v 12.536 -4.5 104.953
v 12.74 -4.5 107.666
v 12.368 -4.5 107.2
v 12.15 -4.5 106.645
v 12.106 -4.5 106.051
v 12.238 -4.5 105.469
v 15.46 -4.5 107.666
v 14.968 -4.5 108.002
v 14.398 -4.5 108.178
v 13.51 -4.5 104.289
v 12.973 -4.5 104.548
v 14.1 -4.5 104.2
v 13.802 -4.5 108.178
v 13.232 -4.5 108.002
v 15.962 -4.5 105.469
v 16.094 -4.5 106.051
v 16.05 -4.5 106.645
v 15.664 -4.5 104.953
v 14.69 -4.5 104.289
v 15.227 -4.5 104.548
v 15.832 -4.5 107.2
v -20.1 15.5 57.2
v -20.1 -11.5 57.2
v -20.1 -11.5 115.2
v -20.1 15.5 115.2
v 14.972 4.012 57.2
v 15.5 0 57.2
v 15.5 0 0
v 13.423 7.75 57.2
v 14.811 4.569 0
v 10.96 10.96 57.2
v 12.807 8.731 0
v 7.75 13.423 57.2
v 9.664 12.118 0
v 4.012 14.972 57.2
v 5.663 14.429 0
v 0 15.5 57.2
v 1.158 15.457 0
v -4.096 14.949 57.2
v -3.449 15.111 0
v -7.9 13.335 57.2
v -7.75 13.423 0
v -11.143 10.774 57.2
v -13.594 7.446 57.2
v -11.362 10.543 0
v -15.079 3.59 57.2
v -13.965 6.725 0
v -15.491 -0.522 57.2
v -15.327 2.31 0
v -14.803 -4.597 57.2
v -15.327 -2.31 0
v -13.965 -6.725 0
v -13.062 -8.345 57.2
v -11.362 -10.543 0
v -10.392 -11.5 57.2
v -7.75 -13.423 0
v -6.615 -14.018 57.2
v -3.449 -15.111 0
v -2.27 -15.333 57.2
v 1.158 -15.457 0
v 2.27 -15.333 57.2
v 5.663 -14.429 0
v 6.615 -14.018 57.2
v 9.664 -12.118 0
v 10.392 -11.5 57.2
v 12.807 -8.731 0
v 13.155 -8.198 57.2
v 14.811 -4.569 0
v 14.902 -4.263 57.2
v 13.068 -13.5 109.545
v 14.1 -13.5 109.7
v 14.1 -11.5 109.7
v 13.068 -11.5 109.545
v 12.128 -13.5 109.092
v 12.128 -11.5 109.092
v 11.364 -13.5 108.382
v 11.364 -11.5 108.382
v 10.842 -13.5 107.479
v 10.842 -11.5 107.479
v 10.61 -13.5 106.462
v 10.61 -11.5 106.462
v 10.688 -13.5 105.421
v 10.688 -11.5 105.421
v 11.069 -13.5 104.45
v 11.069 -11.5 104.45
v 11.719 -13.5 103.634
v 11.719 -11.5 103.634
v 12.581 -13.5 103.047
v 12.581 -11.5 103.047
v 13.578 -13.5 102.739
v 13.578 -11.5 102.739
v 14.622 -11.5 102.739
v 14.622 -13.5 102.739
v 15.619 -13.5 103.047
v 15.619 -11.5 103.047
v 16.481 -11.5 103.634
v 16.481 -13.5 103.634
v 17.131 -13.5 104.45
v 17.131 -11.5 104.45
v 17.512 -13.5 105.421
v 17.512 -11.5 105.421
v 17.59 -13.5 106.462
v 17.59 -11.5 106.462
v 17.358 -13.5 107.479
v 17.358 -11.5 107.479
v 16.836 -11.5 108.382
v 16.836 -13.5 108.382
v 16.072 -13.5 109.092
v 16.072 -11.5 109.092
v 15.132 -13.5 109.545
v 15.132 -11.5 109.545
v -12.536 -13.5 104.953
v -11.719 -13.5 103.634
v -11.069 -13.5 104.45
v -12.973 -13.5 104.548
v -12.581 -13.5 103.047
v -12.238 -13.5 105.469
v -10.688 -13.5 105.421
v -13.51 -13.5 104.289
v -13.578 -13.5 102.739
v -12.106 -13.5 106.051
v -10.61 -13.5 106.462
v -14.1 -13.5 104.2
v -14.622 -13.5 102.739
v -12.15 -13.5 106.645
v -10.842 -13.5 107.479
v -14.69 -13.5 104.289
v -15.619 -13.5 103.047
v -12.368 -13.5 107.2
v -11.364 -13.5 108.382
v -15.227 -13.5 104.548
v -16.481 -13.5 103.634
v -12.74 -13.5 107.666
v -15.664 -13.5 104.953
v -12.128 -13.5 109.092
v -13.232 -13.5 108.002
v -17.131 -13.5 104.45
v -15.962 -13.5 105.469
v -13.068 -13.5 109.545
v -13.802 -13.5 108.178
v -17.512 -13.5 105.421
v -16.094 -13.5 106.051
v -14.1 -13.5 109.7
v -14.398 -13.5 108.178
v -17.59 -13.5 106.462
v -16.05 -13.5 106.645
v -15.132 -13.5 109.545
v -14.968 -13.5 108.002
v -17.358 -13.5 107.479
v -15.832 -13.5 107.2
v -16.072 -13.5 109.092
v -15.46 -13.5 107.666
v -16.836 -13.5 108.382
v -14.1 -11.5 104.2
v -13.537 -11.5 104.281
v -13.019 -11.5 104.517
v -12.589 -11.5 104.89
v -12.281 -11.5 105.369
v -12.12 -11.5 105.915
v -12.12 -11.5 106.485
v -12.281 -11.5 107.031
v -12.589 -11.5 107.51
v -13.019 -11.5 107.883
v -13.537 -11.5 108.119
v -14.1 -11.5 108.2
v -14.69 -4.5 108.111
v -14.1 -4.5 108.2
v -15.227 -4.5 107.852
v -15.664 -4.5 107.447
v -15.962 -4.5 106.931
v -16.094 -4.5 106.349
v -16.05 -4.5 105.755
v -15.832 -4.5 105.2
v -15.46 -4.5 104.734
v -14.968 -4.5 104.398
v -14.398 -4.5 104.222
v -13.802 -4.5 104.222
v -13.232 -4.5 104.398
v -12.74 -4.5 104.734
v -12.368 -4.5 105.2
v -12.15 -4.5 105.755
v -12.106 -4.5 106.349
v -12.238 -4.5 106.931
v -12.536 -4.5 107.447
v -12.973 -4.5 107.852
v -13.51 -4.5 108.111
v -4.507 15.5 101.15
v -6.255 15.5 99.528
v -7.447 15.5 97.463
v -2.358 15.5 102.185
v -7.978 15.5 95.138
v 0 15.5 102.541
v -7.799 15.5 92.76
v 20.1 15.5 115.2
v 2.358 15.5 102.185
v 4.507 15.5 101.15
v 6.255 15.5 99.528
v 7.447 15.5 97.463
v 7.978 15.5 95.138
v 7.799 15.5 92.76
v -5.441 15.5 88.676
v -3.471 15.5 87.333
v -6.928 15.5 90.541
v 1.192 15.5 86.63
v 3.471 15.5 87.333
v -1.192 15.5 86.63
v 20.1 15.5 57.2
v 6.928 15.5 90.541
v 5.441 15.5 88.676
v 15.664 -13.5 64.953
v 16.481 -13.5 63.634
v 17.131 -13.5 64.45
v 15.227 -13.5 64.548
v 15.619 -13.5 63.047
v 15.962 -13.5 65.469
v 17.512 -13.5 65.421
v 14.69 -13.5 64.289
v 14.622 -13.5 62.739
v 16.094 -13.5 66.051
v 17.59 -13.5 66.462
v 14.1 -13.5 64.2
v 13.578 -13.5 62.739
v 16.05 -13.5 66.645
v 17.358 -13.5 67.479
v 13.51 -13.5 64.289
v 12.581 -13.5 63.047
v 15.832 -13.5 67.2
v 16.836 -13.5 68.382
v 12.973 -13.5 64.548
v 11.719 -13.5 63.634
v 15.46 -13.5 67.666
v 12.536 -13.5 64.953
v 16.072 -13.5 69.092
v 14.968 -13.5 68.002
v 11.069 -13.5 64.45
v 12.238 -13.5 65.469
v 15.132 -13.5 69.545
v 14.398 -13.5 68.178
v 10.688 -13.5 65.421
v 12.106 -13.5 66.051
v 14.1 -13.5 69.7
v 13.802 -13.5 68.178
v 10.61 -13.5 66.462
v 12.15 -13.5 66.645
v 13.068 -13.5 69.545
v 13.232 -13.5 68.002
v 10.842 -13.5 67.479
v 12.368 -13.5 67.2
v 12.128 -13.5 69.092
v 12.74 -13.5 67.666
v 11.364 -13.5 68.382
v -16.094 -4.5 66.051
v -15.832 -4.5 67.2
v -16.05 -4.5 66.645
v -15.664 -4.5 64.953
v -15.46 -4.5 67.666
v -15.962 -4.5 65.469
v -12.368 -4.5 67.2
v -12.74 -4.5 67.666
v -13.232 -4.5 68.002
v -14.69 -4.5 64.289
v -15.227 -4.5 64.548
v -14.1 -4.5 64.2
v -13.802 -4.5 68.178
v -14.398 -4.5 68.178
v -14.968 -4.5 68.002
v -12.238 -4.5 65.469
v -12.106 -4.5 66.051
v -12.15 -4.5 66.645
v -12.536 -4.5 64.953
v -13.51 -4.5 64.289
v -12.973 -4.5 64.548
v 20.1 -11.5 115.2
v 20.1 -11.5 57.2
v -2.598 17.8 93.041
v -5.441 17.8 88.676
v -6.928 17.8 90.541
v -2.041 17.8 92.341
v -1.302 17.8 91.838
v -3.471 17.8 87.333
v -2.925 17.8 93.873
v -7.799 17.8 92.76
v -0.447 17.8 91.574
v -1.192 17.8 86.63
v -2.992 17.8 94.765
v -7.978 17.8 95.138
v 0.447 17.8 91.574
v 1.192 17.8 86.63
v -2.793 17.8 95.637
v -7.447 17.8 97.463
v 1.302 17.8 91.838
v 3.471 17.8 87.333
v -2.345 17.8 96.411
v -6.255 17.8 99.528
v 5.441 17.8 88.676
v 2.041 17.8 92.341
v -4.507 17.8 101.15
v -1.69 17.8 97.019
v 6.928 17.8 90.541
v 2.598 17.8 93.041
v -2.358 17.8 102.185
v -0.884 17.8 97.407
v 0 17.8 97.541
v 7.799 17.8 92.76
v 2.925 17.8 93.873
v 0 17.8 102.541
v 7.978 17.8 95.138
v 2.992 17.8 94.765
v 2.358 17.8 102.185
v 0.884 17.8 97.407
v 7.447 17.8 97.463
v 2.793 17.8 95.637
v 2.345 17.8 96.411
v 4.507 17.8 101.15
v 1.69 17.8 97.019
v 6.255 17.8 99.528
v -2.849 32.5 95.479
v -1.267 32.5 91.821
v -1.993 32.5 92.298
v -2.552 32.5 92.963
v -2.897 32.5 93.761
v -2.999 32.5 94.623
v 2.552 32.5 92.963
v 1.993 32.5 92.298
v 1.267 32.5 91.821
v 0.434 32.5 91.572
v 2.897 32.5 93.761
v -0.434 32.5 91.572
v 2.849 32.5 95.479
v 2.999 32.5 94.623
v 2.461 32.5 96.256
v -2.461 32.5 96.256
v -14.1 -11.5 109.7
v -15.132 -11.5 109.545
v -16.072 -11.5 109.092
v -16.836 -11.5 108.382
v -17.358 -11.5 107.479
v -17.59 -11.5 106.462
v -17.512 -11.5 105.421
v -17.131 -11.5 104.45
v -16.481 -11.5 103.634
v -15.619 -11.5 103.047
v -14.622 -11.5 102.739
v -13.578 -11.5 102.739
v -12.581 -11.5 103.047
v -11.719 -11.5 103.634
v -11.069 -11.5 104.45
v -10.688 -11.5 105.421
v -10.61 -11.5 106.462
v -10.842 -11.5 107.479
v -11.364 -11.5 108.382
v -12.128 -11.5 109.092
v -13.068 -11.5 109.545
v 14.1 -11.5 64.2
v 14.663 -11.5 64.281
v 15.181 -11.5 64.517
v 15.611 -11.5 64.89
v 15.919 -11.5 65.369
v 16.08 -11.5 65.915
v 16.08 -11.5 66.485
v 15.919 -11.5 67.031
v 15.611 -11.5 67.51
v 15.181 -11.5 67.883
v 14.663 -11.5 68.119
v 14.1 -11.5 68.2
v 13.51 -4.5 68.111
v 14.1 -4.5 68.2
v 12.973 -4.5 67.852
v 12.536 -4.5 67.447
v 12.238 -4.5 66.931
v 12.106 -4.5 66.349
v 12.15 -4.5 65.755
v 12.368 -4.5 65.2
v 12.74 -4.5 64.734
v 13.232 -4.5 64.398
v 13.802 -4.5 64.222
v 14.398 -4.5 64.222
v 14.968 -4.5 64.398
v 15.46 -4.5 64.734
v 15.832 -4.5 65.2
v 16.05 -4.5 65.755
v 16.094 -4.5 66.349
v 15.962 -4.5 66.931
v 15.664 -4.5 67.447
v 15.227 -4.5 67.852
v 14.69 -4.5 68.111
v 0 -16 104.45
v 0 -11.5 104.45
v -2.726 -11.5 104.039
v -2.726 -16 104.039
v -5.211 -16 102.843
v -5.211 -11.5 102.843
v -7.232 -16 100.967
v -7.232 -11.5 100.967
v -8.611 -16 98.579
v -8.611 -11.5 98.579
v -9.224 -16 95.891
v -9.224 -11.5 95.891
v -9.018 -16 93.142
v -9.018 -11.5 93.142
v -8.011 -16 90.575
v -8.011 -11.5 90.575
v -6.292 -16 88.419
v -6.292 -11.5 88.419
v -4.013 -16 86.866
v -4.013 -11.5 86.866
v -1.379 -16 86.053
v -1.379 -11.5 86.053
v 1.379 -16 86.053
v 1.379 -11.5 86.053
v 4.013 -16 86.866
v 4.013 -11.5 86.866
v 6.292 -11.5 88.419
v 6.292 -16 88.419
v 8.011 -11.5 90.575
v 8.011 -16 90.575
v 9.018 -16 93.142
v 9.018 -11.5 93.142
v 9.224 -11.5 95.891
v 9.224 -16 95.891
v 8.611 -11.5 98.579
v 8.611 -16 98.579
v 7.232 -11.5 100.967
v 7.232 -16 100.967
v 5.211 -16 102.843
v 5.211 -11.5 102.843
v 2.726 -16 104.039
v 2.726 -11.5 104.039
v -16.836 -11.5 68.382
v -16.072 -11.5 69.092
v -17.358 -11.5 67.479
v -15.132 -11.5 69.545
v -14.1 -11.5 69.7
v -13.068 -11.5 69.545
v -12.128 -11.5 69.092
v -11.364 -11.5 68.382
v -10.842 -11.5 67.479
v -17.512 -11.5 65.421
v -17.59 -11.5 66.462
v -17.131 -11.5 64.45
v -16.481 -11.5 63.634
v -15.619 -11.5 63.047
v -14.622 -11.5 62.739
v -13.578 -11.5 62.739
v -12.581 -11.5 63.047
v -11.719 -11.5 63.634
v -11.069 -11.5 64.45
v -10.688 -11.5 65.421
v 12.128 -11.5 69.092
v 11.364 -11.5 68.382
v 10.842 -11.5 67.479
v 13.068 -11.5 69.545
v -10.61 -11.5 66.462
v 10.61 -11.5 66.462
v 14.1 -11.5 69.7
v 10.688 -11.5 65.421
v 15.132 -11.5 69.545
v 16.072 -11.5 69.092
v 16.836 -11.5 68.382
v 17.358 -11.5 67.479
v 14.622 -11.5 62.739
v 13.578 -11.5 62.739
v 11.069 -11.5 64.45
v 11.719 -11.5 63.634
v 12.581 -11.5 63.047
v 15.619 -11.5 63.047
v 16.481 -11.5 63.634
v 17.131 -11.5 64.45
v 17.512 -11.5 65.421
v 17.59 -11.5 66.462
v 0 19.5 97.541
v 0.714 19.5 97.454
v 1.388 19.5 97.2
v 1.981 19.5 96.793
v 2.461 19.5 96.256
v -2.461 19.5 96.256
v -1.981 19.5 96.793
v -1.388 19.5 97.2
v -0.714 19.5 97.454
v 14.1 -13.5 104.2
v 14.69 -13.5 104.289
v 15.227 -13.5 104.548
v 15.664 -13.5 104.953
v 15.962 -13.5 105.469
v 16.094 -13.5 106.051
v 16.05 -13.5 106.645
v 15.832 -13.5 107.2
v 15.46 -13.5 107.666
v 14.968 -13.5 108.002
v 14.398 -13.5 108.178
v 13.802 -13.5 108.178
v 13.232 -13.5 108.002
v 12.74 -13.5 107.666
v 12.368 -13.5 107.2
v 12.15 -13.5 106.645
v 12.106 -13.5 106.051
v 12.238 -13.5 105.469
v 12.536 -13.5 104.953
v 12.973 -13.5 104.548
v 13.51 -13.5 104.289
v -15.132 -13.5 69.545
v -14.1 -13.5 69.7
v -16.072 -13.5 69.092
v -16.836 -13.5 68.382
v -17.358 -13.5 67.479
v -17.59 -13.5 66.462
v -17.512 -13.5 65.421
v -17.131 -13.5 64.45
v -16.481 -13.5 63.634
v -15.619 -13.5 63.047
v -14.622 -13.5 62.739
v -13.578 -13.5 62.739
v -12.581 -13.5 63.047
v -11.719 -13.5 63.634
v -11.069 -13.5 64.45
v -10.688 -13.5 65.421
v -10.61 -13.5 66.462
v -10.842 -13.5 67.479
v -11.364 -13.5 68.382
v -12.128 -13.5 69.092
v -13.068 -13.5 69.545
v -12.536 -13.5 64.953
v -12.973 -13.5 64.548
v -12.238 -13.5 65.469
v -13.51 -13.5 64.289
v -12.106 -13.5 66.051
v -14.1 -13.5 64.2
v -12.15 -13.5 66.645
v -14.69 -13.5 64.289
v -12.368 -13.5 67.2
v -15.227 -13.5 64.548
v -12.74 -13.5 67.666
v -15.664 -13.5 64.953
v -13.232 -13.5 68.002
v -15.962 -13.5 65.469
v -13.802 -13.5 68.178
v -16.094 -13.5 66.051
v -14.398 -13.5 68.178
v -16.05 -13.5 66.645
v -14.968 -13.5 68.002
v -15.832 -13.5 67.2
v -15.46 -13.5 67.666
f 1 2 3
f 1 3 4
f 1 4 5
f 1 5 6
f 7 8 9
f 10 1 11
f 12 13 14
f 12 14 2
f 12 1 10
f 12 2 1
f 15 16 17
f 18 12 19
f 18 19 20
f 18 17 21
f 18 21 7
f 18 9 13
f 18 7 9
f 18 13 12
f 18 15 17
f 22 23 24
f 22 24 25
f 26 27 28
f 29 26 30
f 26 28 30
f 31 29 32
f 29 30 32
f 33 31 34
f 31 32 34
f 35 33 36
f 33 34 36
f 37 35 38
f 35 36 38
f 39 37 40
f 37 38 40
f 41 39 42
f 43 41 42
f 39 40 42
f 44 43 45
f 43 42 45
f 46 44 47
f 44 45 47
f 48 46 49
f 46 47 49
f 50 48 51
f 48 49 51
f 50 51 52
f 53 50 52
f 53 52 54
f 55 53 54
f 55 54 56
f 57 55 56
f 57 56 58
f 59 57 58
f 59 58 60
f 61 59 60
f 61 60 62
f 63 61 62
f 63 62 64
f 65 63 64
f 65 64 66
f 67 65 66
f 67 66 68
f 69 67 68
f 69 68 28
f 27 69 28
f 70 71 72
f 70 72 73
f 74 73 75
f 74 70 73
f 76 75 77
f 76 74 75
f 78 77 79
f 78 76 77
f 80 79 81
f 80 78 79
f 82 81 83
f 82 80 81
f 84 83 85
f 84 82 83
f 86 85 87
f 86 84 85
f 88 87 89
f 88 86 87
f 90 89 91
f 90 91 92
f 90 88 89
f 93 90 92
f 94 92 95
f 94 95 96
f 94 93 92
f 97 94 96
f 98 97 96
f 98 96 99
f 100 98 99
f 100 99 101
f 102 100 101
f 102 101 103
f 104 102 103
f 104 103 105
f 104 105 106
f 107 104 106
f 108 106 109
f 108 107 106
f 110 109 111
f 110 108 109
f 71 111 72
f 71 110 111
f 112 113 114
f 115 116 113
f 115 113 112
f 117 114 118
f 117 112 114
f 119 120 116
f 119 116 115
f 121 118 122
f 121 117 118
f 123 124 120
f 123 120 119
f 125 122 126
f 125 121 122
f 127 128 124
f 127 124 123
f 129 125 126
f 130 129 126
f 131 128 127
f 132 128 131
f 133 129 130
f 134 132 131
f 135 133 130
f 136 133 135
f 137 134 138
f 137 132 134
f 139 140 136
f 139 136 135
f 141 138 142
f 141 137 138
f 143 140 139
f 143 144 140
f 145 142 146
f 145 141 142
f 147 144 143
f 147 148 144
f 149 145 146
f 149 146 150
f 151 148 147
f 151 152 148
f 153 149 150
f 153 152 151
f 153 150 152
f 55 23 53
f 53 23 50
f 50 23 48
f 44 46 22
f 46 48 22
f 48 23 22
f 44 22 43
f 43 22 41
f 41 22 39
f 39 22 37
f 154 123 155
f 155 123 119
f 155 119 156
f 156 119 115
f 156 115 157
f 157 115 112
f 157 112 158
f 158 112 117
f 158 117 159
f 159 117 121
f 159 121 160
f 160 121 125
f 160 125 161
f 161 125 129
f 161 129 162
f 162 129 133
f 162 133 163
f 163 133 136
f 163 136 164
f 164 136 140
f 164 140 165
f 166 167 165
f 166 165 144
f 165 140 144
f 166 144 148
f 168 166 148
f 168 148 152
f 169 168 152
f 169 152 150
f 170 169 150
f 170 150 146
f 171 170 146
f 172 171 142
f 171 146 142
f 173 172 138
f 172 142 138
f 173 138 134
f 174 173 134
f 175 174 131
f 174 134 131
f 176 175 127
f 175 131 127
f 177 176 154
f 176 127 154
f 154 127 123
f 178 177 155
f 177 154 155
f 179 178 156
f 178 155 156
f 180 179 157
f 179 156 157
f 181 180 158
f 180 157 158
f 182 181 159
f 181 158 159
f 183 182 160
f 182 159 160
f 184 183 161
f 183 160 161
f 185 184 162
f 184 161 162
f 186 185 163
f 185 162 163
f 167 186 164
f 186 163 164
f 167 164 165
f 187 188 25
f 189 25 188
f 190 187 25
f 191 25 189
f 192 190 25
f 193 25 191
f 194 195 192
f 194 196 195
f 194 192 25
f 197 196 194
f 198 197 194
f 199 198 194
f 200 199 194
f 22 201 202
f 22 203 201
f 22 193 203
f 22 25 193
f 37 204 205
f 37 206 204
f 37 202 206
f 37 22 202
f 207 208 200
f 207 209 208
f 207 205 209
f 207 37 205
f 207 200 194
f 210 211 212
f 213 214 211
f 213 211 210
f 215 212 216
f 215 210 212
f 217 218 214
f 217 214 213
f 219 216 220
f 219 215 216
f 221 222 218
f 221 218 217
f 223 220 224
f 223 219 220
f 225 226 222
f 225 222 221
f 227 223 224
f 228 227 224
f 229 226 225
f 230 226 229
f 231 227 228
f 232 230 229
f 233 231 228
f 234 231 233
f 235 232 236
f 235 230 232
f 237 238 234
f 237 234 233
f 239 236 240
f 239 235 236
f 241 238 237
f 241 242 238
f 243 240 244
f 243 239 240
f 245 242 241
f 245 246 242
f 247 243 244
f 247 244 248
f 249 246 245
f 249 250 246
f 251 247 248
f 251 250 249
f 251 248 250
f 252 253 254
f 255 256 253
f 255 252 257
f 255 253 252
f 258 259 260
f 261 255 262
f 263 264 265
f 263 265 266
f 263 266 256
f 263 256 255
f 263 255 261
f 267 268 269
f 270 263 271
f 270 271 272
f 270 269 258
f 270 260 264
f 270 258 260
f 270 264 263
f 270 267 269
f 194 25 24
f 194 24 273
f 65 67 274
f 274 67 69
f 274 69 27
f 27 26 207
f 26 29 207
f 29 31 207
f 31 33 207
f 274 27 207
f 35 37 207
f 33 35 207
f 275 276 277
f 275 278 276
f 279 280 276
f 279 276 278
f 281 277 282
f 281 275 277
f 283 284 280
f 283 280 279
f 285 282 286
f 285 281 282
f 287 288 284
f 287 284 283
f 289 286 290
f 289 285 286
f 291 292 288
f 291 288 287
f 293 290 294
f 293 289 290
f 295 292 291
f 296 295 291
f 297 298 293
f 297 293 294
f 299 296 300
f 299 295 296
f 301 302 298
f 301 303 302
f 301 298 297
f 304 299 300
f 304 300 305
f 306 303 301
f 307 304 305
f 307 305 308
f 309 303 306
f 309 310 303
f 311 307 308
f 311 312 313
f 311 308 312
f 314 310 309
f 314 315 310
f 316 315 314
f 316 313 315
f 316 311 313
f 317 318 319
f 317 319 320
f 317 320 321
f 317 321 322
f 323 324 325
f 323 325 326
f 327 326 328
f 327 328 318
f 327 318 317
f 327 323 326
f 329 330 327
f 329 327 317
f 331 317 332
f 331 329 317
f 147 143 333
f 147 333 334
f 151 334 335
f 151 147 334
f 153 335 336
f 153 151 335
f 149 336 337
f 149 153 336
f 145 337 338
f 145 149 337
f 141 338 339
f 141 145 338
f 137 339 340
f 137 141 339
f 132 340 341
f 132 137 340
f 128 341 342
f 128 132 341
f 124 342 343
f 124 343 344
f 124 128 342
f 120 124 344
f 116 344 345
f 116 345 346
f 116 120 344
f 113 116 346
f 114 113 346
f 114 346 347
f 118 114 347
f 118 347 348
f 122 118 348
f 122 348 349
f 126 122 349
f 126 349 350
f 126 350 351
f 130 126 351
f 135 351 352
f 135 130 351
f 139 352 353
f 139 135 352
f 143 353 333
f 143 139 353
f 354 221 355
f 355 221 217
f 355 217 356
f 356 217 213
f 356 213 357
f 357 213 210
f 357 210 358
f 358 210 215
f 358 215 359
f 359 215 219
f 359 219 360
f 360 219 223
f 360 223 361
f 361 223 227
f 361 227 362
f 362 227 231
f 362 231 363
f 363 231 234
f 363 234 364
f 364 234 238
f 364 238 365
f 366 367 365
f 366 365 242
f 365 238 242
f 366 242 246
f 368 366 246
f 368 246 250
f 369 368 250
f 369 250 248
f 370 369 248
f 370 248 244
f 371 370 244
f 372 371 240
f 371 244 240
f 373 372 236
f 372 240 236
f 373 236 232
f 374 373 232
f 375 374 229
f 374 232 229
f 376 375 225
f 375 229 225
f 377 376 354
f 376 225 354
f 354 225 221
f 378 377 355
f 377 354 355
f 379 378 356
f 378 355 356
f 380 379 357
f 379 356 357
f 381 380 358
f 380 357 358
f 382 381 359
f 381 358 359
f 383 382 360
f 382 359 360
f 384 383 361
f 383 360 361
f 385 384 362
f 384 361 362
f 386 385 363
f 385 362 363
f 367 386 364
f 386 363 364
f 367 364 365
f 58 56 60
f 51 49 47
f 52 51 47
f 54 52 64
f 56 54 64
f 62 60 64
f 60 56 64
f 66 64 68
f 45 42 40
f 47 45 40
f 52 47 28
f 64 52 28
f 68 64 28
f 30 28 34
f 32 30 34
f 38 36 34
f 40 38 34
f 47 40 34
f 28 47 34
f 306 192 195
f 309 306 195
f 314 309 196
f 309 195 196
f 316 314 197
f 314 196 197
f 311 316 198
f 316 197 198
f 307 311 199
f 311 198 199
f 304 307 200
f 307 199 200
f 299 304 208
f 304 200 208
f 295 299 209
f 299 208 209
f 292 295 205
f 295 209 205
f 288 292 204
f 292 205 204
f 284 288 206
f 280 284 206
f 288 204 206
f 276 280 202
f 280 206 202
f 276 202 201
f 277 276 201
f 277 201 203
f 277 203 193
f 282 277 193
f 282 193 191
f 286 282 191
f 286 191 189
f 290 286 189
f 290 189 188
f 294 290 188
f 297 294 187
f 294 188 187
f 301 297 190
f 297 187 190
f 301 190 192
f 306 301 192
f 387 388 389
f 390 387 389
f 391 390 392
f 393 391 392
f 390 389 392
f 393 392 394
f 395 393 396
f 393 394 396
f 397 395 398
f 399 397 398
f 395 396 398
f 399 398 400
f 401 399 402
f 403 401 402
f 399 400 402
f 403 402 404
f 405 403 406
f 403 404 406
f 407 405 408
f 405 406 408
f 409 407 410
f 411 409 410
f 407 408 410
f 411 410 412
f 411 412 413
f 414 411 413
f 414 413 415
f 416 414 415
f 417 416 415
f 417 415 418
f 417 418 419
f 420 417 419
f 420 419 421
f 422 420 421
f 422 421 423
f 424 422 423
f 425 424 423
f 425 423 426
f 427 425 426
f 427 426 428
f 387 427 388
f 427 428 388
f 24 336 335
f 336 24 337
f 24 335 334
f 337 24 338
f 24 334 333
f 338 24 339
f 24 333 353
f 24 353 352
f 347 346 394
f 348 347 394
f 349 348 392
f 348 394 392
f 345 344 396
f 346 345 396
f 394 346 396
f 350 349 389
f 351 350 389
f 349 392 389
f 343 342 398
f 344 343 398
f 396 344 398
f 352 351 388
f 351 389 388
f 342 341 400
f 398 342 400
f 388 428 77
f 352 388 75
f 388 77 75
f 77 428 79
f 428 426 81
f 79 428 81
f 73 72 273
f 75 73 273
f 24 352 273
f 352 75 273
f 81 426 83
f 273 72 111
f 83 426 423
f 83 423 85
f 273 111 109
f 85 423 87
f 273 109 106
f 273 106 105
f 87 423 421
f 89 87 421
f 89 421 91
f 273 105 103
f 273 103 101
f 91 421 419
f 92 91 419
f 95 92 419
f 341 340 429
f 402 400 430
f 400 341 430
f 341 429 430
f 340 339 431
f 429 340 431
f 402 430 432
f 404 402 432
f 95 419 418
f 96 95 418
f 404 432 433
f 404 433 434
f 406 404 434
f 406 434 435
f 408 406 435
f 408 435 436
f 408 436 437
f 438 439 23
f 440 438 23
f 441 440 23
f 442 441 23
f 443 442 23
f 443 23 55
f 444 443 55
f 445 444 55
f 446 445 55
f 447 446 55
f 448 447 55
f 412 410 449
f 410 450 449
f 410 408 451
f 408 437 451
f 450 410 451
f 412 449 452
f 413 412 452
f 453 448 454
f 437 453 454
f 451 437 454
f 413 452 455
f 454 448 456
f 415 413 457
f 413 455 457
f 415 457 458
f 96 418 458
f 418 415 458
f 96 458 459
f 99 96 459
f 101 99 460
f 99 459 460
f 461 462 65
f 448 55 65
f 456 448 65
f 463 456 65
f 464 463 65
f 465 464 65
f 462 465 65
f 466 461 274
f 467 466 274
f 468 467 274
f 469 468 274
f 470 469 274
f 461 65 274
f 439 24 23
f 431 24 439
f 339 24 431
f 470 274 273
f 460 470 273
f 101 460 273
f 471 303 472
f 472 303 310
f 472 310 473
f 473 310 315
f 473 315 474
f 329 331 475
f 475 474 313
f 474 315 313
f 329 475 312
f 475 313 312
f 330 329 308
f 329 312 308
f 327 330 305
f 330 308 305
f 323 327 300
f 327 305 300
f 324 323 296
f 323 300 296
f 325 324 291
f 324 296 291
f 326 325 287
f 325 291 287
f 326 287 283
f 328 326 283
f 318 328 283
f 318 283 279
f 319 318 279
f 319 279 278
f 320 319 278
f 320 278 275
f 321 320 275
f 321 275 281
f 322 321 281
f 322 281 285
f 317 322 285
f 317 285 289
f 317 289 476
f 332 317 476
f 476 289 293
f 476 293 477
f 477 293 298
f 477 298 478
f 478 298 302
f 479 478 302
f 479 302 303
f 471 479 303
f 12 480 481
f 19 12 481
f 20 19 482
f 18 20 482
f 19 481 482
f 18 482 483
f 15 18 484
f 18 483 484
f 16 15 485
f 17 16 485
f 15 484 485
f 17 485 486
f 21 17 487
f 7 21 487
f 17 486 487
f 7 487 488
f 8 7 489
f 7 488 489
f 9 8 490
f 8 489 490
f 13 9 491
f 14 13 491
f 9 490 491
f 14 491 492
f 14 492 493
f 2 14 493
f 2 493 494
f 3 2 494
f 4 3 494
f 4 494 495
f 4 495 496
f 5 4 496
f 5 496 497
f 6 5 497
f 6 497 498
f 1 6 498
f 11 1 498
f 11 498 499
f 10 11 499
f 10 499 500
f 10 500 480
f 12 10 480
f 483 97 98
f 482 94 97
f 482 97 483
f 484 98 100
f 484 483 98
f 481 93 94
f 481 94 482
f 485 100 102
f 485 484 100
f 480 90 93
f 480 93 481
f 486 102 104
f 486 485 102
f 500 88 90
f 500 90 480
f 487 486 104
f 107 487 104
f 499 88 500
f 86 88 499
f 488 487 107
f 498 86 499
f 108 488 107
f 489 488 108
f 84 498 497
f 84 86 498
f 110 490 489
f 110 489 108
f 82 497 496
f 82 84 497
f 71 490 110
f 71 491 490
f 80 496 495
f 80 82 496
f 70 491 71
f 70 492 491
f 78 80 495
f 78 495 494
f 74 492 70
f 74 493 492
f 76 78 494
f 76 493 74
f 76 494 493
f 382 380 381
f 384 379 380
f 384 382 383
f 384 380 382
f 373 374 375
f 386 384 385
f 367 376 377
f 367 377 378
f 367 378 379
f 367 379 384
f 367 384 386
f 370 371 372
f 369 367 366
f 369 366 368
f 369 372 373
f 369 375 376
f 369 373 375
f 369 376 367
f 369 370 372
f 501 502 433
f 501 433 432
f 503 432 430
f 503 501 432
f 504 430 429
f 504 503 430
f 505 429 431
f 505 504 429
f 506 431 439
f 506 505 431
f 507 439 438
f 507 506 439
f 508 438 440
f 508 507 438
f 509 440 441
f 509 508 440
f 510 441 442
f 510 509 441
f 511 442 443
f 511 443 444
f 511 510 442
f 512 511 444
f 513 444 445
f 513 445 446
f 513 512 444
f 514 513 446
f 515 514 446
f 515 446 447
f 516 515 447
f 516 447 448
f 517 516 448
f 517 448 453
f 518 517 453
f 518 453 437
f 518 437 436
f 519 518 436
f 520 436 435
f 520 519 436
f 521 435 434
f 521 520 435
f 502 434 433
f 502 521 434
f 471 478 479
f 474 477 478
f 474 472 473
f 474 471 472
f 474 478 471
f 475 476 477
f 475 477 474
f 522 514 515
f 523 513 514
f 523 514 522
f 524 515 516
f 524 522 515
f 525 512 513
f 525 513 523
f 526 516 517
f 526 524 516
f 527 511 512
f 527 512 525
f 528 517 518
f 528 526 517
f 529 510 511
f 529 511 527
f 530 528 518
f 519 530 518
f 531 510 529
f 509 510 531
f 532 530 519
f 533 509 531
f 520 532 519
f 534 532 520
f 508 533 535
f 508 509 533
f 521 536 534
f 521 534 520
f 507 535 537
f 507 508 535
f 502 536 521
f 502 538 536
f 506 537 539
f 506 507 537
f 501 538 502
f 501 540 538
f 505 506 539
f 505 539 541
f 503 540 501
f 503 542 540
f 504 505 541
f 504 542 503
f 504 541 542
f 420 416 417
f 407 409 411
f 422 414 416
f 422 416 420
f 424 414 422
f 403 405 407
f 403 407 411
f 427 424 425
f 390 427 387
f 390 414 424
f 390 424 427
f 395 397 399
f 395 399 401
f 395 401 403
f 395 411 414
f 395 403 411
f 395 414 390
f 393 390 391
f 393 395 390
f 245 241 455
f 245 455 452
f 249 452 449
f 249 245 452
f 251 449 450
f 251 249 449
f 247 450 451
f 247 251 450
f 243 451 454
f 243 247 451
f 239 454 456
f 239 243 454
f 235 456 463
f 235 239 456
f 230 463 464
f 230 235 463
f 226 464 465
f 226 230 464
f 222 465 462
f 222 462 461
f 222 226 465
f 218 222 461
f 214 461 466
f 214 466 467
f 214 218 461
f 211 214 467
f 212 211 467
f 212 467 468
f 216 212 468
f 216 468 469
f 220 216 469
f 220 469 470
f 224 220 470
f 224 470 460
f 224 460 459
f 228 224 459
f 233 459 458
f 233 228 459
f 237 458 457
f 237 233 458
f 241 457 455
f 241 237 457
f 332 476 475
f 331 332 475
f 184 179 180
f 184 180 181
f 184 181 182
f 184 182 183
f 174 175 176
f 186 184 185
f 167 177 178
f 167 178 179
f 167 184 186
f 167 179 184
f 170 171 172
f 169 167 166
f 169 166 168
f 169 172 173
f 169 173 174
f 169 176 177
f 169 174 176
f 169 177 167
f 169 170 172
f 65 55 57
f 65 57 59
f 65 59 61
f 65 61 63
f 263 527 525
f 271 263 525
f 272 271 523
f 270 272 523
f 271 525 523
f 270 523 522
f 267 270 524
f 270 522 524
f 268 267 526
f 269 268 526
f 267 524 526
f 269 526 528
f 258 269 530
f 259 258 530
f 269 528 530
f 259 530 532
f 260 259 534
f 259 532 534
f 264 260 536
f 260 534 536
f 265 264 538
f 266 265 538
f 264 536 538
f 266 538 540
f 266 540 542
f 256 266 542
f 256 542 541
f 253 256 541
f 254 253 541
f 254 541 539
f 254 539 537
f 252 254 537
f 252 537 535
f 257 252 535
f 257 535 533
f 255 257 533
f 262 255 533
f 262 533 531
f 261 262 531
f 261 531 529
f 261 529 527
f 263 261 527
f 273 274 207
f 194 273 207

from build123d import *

# Parameters (mm, degrees)
SZKIC1_R                    = 15.5
DODANIE_WYCI_GNI_CIE1_DEPTH = 57.2
SZKIC2_W                    = 40.2
SZKIC2_H                    = 27
DODANIE_WYCI_GNI_CIE2_DEPTH = 58
SZKIC3_R                    = 8
DODANIE_WYCI_GNI_CIE3_DEPTH = 2.3
SZKIC4_R                    = 3
DODANIE_WYCI_GNI_CIE4_DEPTH = 14.7
SZKIC5_W                    = 6.794003974
SZKIC5_H                    = 1.284090098
WYTNIJ_WYCI_GNI_CIE1_DEPTH  = 13
SZKIC6_R                    = 2
WYTNIJ_WYCI_GNI_CIE2_DEPTH  = 7
SZKIC7_R                    = 9.25
DODANIE_WYCI_GNI_CIE5_DEPTH = 4.5
DODANIE_WYCI_GNI_CIE6_START = 2
SZKIC8_R                    = 3.5
SZKIC8_R_2                  = 2
DODANIE_WYCI_GNI_CIE6_DEPTH = 2


with BuildPart() as part:
    # Szkic1 → Dodanie-wyciągnięcie1 (new body)
    with BuildSketch(Plane.XY):
        Circle(SZKIC1_R)
    extrude(amount=DODANIE_WYCI_GNI_CIE1_DEPTH)

    # Szkic2 → Dodanie-wyciągnięcie2 (add)
    with BuildSketch(Plane.XY.offset(57.2)):
        with Locations((0, 2)):
            Rectangle(SZKIC2_W, SZKIC2_H)
    extrude(amount=DODANIE_WYCI_GNI_CIE2_DEPTH)

    # Szkic3 → Dodanie-wyciągnięcie3 (add)
    with BuildSketch(Plane(origin=(0, 15.5, 0), x_dir=(1, 0, 0), z_dir=(0, 1, 0))):
        with Locations(Location((0, -94.540551958, 0), (0, 0, 270))):
            Circle(SZKIC3_R)
    extrude(amount=DODANIE_WYCI_GNI_CIE3_DEPTH)

    # Szkic4 → Dodanie-wyciągnięcie4 (add)
    with BuildSketch(Plane(origin=(0, 17.8, 0), x_dir=(1, 0, 0), z_dir=(0, 1, 0))):
        with Locations(Location((0, -94.540551958, 0), (0, 0, 270))):
            Circle(SZKIC4_R)
    extrude(amount=DODANIE_WYCI_GNI_CIE4_DEPTH)

    # Szkic5 → Wytnij-wyciągnięcie1 (cut)
    with BuildSketch(Plane(origin=(0, 32.5, 0), x_dir=(1, 0, 0), z_dir=(0, 1, 0))):
        with Locations((0.179126758, -96.898506909)):
            Rectangle(SZKIC5_W, SZKIC5_H)
    extrude(amount=-WYTNIJ_WYCI_GNI_CIE1_DEPTH, mode=Mode.SUBTRACT)

    # Szkic6 → Wytnij-wyciągnięcie2 (cut)
    with BuildSketch(Plane.XZ.offset(11.5)):
        with Locations(Location((14.1, 106.2, 0), (0, 0, 270))):
            Circle(SZKIC6_R)
        with Locations(Location((14.1, 66.2, 0), (0, 0, 90))):
            Circle(SZKIC6_R)
        with Locations(Location((-14.1, 66.2, 0), (0, 0, 270))):
            Circle(SZKIC6_R)
        with Locations(Location((-14.1, 106.2, 0), (0, 0, 90))):
            Circle(SZKIC6_R)
    extrude(amount=-WYTNIJ_WYCI_GNI_CIE2_DEPTH, mode=Mode.SUBTRACT)

    # Szkic7 → Dodanie-wyciągnięcie5 (add)
    with BuildSketch(Plane.XZ.offset(11.5)):
        with Locations(Location((0, 95.2, 0), (0, 0, 90))):
            Circle(SZKIC7_R)
    extrude(amount=DODANIE_WYCI_GNI_CIE5_DEPTH)

    # Szkic8 → Dodanie-wyciągnięcie6 (add)
    # profile 1 of 4: a face of its own
    with BuildSketch(Plane.XZ.offset(11.5).offset(DODANIE_WYCI_GNI_CIE6_START)):
        with Locations(Location((14.1, 106.2, 0), (0, 0, 90))):
            Circle(SZKIC8_R)
        with Locations(Location((14.1, 106.2, 0), (0, 0, 270))):
            Circle(SZKIC8_R_2, mode=Mode.SUBTRACT)
    # profile 2 of 4: a face of its own
    with BuildSketch(Plane.XZ.offset(11.5).offset(DODANIE_WYCI_GNI_CIE6_START)):
        with Locations(Location((14.1, 66.2, 0), (0, 0, 90))):
            Circle(SZKIC8_R)
        with Locations(Location((14.1, 66.2, 0), (0, 0, 270))):
            Circle(SZKIC8_R_2, mode=Mode.SUBTRACT)
    # profile 3 of 4: a face of its own
    with BuildSketch(Plane.XZ.offset(11.5).offset(DODANIE_WYCI_GNI_CIE6_START)):
        with Locations(Location((-14.1, 66.2, 0), (0, 0, 90))):
            Circle(SZKIC8_R)
        with Locations(Location((-14.1, 66.2, 0), (0, 0, 270))):
            Circle(SZKIC8_R_2, mode=Mode.SUBTRACT)
    # profile 4 of 4: a face of its own
    with BuildSketch(Plane.XZ.offset(11.5).offset(DODANIE_WYCI_GNI_CIE6_START)):
        with Locations(Location((-14.1, 106.2, 0), (0, 0, 90))):
            Circle(SZKIC8_R)
        with Locations(Location((-14.1, 106.2, 0), (0, 0, 270))):
            Circle(SZKIC8_R_2, mode=Mode.SUBTRACT)
    extrude(amount=-DODANIE_WYCI_GNI_CIE6_DEPTH)


solid = part.part
